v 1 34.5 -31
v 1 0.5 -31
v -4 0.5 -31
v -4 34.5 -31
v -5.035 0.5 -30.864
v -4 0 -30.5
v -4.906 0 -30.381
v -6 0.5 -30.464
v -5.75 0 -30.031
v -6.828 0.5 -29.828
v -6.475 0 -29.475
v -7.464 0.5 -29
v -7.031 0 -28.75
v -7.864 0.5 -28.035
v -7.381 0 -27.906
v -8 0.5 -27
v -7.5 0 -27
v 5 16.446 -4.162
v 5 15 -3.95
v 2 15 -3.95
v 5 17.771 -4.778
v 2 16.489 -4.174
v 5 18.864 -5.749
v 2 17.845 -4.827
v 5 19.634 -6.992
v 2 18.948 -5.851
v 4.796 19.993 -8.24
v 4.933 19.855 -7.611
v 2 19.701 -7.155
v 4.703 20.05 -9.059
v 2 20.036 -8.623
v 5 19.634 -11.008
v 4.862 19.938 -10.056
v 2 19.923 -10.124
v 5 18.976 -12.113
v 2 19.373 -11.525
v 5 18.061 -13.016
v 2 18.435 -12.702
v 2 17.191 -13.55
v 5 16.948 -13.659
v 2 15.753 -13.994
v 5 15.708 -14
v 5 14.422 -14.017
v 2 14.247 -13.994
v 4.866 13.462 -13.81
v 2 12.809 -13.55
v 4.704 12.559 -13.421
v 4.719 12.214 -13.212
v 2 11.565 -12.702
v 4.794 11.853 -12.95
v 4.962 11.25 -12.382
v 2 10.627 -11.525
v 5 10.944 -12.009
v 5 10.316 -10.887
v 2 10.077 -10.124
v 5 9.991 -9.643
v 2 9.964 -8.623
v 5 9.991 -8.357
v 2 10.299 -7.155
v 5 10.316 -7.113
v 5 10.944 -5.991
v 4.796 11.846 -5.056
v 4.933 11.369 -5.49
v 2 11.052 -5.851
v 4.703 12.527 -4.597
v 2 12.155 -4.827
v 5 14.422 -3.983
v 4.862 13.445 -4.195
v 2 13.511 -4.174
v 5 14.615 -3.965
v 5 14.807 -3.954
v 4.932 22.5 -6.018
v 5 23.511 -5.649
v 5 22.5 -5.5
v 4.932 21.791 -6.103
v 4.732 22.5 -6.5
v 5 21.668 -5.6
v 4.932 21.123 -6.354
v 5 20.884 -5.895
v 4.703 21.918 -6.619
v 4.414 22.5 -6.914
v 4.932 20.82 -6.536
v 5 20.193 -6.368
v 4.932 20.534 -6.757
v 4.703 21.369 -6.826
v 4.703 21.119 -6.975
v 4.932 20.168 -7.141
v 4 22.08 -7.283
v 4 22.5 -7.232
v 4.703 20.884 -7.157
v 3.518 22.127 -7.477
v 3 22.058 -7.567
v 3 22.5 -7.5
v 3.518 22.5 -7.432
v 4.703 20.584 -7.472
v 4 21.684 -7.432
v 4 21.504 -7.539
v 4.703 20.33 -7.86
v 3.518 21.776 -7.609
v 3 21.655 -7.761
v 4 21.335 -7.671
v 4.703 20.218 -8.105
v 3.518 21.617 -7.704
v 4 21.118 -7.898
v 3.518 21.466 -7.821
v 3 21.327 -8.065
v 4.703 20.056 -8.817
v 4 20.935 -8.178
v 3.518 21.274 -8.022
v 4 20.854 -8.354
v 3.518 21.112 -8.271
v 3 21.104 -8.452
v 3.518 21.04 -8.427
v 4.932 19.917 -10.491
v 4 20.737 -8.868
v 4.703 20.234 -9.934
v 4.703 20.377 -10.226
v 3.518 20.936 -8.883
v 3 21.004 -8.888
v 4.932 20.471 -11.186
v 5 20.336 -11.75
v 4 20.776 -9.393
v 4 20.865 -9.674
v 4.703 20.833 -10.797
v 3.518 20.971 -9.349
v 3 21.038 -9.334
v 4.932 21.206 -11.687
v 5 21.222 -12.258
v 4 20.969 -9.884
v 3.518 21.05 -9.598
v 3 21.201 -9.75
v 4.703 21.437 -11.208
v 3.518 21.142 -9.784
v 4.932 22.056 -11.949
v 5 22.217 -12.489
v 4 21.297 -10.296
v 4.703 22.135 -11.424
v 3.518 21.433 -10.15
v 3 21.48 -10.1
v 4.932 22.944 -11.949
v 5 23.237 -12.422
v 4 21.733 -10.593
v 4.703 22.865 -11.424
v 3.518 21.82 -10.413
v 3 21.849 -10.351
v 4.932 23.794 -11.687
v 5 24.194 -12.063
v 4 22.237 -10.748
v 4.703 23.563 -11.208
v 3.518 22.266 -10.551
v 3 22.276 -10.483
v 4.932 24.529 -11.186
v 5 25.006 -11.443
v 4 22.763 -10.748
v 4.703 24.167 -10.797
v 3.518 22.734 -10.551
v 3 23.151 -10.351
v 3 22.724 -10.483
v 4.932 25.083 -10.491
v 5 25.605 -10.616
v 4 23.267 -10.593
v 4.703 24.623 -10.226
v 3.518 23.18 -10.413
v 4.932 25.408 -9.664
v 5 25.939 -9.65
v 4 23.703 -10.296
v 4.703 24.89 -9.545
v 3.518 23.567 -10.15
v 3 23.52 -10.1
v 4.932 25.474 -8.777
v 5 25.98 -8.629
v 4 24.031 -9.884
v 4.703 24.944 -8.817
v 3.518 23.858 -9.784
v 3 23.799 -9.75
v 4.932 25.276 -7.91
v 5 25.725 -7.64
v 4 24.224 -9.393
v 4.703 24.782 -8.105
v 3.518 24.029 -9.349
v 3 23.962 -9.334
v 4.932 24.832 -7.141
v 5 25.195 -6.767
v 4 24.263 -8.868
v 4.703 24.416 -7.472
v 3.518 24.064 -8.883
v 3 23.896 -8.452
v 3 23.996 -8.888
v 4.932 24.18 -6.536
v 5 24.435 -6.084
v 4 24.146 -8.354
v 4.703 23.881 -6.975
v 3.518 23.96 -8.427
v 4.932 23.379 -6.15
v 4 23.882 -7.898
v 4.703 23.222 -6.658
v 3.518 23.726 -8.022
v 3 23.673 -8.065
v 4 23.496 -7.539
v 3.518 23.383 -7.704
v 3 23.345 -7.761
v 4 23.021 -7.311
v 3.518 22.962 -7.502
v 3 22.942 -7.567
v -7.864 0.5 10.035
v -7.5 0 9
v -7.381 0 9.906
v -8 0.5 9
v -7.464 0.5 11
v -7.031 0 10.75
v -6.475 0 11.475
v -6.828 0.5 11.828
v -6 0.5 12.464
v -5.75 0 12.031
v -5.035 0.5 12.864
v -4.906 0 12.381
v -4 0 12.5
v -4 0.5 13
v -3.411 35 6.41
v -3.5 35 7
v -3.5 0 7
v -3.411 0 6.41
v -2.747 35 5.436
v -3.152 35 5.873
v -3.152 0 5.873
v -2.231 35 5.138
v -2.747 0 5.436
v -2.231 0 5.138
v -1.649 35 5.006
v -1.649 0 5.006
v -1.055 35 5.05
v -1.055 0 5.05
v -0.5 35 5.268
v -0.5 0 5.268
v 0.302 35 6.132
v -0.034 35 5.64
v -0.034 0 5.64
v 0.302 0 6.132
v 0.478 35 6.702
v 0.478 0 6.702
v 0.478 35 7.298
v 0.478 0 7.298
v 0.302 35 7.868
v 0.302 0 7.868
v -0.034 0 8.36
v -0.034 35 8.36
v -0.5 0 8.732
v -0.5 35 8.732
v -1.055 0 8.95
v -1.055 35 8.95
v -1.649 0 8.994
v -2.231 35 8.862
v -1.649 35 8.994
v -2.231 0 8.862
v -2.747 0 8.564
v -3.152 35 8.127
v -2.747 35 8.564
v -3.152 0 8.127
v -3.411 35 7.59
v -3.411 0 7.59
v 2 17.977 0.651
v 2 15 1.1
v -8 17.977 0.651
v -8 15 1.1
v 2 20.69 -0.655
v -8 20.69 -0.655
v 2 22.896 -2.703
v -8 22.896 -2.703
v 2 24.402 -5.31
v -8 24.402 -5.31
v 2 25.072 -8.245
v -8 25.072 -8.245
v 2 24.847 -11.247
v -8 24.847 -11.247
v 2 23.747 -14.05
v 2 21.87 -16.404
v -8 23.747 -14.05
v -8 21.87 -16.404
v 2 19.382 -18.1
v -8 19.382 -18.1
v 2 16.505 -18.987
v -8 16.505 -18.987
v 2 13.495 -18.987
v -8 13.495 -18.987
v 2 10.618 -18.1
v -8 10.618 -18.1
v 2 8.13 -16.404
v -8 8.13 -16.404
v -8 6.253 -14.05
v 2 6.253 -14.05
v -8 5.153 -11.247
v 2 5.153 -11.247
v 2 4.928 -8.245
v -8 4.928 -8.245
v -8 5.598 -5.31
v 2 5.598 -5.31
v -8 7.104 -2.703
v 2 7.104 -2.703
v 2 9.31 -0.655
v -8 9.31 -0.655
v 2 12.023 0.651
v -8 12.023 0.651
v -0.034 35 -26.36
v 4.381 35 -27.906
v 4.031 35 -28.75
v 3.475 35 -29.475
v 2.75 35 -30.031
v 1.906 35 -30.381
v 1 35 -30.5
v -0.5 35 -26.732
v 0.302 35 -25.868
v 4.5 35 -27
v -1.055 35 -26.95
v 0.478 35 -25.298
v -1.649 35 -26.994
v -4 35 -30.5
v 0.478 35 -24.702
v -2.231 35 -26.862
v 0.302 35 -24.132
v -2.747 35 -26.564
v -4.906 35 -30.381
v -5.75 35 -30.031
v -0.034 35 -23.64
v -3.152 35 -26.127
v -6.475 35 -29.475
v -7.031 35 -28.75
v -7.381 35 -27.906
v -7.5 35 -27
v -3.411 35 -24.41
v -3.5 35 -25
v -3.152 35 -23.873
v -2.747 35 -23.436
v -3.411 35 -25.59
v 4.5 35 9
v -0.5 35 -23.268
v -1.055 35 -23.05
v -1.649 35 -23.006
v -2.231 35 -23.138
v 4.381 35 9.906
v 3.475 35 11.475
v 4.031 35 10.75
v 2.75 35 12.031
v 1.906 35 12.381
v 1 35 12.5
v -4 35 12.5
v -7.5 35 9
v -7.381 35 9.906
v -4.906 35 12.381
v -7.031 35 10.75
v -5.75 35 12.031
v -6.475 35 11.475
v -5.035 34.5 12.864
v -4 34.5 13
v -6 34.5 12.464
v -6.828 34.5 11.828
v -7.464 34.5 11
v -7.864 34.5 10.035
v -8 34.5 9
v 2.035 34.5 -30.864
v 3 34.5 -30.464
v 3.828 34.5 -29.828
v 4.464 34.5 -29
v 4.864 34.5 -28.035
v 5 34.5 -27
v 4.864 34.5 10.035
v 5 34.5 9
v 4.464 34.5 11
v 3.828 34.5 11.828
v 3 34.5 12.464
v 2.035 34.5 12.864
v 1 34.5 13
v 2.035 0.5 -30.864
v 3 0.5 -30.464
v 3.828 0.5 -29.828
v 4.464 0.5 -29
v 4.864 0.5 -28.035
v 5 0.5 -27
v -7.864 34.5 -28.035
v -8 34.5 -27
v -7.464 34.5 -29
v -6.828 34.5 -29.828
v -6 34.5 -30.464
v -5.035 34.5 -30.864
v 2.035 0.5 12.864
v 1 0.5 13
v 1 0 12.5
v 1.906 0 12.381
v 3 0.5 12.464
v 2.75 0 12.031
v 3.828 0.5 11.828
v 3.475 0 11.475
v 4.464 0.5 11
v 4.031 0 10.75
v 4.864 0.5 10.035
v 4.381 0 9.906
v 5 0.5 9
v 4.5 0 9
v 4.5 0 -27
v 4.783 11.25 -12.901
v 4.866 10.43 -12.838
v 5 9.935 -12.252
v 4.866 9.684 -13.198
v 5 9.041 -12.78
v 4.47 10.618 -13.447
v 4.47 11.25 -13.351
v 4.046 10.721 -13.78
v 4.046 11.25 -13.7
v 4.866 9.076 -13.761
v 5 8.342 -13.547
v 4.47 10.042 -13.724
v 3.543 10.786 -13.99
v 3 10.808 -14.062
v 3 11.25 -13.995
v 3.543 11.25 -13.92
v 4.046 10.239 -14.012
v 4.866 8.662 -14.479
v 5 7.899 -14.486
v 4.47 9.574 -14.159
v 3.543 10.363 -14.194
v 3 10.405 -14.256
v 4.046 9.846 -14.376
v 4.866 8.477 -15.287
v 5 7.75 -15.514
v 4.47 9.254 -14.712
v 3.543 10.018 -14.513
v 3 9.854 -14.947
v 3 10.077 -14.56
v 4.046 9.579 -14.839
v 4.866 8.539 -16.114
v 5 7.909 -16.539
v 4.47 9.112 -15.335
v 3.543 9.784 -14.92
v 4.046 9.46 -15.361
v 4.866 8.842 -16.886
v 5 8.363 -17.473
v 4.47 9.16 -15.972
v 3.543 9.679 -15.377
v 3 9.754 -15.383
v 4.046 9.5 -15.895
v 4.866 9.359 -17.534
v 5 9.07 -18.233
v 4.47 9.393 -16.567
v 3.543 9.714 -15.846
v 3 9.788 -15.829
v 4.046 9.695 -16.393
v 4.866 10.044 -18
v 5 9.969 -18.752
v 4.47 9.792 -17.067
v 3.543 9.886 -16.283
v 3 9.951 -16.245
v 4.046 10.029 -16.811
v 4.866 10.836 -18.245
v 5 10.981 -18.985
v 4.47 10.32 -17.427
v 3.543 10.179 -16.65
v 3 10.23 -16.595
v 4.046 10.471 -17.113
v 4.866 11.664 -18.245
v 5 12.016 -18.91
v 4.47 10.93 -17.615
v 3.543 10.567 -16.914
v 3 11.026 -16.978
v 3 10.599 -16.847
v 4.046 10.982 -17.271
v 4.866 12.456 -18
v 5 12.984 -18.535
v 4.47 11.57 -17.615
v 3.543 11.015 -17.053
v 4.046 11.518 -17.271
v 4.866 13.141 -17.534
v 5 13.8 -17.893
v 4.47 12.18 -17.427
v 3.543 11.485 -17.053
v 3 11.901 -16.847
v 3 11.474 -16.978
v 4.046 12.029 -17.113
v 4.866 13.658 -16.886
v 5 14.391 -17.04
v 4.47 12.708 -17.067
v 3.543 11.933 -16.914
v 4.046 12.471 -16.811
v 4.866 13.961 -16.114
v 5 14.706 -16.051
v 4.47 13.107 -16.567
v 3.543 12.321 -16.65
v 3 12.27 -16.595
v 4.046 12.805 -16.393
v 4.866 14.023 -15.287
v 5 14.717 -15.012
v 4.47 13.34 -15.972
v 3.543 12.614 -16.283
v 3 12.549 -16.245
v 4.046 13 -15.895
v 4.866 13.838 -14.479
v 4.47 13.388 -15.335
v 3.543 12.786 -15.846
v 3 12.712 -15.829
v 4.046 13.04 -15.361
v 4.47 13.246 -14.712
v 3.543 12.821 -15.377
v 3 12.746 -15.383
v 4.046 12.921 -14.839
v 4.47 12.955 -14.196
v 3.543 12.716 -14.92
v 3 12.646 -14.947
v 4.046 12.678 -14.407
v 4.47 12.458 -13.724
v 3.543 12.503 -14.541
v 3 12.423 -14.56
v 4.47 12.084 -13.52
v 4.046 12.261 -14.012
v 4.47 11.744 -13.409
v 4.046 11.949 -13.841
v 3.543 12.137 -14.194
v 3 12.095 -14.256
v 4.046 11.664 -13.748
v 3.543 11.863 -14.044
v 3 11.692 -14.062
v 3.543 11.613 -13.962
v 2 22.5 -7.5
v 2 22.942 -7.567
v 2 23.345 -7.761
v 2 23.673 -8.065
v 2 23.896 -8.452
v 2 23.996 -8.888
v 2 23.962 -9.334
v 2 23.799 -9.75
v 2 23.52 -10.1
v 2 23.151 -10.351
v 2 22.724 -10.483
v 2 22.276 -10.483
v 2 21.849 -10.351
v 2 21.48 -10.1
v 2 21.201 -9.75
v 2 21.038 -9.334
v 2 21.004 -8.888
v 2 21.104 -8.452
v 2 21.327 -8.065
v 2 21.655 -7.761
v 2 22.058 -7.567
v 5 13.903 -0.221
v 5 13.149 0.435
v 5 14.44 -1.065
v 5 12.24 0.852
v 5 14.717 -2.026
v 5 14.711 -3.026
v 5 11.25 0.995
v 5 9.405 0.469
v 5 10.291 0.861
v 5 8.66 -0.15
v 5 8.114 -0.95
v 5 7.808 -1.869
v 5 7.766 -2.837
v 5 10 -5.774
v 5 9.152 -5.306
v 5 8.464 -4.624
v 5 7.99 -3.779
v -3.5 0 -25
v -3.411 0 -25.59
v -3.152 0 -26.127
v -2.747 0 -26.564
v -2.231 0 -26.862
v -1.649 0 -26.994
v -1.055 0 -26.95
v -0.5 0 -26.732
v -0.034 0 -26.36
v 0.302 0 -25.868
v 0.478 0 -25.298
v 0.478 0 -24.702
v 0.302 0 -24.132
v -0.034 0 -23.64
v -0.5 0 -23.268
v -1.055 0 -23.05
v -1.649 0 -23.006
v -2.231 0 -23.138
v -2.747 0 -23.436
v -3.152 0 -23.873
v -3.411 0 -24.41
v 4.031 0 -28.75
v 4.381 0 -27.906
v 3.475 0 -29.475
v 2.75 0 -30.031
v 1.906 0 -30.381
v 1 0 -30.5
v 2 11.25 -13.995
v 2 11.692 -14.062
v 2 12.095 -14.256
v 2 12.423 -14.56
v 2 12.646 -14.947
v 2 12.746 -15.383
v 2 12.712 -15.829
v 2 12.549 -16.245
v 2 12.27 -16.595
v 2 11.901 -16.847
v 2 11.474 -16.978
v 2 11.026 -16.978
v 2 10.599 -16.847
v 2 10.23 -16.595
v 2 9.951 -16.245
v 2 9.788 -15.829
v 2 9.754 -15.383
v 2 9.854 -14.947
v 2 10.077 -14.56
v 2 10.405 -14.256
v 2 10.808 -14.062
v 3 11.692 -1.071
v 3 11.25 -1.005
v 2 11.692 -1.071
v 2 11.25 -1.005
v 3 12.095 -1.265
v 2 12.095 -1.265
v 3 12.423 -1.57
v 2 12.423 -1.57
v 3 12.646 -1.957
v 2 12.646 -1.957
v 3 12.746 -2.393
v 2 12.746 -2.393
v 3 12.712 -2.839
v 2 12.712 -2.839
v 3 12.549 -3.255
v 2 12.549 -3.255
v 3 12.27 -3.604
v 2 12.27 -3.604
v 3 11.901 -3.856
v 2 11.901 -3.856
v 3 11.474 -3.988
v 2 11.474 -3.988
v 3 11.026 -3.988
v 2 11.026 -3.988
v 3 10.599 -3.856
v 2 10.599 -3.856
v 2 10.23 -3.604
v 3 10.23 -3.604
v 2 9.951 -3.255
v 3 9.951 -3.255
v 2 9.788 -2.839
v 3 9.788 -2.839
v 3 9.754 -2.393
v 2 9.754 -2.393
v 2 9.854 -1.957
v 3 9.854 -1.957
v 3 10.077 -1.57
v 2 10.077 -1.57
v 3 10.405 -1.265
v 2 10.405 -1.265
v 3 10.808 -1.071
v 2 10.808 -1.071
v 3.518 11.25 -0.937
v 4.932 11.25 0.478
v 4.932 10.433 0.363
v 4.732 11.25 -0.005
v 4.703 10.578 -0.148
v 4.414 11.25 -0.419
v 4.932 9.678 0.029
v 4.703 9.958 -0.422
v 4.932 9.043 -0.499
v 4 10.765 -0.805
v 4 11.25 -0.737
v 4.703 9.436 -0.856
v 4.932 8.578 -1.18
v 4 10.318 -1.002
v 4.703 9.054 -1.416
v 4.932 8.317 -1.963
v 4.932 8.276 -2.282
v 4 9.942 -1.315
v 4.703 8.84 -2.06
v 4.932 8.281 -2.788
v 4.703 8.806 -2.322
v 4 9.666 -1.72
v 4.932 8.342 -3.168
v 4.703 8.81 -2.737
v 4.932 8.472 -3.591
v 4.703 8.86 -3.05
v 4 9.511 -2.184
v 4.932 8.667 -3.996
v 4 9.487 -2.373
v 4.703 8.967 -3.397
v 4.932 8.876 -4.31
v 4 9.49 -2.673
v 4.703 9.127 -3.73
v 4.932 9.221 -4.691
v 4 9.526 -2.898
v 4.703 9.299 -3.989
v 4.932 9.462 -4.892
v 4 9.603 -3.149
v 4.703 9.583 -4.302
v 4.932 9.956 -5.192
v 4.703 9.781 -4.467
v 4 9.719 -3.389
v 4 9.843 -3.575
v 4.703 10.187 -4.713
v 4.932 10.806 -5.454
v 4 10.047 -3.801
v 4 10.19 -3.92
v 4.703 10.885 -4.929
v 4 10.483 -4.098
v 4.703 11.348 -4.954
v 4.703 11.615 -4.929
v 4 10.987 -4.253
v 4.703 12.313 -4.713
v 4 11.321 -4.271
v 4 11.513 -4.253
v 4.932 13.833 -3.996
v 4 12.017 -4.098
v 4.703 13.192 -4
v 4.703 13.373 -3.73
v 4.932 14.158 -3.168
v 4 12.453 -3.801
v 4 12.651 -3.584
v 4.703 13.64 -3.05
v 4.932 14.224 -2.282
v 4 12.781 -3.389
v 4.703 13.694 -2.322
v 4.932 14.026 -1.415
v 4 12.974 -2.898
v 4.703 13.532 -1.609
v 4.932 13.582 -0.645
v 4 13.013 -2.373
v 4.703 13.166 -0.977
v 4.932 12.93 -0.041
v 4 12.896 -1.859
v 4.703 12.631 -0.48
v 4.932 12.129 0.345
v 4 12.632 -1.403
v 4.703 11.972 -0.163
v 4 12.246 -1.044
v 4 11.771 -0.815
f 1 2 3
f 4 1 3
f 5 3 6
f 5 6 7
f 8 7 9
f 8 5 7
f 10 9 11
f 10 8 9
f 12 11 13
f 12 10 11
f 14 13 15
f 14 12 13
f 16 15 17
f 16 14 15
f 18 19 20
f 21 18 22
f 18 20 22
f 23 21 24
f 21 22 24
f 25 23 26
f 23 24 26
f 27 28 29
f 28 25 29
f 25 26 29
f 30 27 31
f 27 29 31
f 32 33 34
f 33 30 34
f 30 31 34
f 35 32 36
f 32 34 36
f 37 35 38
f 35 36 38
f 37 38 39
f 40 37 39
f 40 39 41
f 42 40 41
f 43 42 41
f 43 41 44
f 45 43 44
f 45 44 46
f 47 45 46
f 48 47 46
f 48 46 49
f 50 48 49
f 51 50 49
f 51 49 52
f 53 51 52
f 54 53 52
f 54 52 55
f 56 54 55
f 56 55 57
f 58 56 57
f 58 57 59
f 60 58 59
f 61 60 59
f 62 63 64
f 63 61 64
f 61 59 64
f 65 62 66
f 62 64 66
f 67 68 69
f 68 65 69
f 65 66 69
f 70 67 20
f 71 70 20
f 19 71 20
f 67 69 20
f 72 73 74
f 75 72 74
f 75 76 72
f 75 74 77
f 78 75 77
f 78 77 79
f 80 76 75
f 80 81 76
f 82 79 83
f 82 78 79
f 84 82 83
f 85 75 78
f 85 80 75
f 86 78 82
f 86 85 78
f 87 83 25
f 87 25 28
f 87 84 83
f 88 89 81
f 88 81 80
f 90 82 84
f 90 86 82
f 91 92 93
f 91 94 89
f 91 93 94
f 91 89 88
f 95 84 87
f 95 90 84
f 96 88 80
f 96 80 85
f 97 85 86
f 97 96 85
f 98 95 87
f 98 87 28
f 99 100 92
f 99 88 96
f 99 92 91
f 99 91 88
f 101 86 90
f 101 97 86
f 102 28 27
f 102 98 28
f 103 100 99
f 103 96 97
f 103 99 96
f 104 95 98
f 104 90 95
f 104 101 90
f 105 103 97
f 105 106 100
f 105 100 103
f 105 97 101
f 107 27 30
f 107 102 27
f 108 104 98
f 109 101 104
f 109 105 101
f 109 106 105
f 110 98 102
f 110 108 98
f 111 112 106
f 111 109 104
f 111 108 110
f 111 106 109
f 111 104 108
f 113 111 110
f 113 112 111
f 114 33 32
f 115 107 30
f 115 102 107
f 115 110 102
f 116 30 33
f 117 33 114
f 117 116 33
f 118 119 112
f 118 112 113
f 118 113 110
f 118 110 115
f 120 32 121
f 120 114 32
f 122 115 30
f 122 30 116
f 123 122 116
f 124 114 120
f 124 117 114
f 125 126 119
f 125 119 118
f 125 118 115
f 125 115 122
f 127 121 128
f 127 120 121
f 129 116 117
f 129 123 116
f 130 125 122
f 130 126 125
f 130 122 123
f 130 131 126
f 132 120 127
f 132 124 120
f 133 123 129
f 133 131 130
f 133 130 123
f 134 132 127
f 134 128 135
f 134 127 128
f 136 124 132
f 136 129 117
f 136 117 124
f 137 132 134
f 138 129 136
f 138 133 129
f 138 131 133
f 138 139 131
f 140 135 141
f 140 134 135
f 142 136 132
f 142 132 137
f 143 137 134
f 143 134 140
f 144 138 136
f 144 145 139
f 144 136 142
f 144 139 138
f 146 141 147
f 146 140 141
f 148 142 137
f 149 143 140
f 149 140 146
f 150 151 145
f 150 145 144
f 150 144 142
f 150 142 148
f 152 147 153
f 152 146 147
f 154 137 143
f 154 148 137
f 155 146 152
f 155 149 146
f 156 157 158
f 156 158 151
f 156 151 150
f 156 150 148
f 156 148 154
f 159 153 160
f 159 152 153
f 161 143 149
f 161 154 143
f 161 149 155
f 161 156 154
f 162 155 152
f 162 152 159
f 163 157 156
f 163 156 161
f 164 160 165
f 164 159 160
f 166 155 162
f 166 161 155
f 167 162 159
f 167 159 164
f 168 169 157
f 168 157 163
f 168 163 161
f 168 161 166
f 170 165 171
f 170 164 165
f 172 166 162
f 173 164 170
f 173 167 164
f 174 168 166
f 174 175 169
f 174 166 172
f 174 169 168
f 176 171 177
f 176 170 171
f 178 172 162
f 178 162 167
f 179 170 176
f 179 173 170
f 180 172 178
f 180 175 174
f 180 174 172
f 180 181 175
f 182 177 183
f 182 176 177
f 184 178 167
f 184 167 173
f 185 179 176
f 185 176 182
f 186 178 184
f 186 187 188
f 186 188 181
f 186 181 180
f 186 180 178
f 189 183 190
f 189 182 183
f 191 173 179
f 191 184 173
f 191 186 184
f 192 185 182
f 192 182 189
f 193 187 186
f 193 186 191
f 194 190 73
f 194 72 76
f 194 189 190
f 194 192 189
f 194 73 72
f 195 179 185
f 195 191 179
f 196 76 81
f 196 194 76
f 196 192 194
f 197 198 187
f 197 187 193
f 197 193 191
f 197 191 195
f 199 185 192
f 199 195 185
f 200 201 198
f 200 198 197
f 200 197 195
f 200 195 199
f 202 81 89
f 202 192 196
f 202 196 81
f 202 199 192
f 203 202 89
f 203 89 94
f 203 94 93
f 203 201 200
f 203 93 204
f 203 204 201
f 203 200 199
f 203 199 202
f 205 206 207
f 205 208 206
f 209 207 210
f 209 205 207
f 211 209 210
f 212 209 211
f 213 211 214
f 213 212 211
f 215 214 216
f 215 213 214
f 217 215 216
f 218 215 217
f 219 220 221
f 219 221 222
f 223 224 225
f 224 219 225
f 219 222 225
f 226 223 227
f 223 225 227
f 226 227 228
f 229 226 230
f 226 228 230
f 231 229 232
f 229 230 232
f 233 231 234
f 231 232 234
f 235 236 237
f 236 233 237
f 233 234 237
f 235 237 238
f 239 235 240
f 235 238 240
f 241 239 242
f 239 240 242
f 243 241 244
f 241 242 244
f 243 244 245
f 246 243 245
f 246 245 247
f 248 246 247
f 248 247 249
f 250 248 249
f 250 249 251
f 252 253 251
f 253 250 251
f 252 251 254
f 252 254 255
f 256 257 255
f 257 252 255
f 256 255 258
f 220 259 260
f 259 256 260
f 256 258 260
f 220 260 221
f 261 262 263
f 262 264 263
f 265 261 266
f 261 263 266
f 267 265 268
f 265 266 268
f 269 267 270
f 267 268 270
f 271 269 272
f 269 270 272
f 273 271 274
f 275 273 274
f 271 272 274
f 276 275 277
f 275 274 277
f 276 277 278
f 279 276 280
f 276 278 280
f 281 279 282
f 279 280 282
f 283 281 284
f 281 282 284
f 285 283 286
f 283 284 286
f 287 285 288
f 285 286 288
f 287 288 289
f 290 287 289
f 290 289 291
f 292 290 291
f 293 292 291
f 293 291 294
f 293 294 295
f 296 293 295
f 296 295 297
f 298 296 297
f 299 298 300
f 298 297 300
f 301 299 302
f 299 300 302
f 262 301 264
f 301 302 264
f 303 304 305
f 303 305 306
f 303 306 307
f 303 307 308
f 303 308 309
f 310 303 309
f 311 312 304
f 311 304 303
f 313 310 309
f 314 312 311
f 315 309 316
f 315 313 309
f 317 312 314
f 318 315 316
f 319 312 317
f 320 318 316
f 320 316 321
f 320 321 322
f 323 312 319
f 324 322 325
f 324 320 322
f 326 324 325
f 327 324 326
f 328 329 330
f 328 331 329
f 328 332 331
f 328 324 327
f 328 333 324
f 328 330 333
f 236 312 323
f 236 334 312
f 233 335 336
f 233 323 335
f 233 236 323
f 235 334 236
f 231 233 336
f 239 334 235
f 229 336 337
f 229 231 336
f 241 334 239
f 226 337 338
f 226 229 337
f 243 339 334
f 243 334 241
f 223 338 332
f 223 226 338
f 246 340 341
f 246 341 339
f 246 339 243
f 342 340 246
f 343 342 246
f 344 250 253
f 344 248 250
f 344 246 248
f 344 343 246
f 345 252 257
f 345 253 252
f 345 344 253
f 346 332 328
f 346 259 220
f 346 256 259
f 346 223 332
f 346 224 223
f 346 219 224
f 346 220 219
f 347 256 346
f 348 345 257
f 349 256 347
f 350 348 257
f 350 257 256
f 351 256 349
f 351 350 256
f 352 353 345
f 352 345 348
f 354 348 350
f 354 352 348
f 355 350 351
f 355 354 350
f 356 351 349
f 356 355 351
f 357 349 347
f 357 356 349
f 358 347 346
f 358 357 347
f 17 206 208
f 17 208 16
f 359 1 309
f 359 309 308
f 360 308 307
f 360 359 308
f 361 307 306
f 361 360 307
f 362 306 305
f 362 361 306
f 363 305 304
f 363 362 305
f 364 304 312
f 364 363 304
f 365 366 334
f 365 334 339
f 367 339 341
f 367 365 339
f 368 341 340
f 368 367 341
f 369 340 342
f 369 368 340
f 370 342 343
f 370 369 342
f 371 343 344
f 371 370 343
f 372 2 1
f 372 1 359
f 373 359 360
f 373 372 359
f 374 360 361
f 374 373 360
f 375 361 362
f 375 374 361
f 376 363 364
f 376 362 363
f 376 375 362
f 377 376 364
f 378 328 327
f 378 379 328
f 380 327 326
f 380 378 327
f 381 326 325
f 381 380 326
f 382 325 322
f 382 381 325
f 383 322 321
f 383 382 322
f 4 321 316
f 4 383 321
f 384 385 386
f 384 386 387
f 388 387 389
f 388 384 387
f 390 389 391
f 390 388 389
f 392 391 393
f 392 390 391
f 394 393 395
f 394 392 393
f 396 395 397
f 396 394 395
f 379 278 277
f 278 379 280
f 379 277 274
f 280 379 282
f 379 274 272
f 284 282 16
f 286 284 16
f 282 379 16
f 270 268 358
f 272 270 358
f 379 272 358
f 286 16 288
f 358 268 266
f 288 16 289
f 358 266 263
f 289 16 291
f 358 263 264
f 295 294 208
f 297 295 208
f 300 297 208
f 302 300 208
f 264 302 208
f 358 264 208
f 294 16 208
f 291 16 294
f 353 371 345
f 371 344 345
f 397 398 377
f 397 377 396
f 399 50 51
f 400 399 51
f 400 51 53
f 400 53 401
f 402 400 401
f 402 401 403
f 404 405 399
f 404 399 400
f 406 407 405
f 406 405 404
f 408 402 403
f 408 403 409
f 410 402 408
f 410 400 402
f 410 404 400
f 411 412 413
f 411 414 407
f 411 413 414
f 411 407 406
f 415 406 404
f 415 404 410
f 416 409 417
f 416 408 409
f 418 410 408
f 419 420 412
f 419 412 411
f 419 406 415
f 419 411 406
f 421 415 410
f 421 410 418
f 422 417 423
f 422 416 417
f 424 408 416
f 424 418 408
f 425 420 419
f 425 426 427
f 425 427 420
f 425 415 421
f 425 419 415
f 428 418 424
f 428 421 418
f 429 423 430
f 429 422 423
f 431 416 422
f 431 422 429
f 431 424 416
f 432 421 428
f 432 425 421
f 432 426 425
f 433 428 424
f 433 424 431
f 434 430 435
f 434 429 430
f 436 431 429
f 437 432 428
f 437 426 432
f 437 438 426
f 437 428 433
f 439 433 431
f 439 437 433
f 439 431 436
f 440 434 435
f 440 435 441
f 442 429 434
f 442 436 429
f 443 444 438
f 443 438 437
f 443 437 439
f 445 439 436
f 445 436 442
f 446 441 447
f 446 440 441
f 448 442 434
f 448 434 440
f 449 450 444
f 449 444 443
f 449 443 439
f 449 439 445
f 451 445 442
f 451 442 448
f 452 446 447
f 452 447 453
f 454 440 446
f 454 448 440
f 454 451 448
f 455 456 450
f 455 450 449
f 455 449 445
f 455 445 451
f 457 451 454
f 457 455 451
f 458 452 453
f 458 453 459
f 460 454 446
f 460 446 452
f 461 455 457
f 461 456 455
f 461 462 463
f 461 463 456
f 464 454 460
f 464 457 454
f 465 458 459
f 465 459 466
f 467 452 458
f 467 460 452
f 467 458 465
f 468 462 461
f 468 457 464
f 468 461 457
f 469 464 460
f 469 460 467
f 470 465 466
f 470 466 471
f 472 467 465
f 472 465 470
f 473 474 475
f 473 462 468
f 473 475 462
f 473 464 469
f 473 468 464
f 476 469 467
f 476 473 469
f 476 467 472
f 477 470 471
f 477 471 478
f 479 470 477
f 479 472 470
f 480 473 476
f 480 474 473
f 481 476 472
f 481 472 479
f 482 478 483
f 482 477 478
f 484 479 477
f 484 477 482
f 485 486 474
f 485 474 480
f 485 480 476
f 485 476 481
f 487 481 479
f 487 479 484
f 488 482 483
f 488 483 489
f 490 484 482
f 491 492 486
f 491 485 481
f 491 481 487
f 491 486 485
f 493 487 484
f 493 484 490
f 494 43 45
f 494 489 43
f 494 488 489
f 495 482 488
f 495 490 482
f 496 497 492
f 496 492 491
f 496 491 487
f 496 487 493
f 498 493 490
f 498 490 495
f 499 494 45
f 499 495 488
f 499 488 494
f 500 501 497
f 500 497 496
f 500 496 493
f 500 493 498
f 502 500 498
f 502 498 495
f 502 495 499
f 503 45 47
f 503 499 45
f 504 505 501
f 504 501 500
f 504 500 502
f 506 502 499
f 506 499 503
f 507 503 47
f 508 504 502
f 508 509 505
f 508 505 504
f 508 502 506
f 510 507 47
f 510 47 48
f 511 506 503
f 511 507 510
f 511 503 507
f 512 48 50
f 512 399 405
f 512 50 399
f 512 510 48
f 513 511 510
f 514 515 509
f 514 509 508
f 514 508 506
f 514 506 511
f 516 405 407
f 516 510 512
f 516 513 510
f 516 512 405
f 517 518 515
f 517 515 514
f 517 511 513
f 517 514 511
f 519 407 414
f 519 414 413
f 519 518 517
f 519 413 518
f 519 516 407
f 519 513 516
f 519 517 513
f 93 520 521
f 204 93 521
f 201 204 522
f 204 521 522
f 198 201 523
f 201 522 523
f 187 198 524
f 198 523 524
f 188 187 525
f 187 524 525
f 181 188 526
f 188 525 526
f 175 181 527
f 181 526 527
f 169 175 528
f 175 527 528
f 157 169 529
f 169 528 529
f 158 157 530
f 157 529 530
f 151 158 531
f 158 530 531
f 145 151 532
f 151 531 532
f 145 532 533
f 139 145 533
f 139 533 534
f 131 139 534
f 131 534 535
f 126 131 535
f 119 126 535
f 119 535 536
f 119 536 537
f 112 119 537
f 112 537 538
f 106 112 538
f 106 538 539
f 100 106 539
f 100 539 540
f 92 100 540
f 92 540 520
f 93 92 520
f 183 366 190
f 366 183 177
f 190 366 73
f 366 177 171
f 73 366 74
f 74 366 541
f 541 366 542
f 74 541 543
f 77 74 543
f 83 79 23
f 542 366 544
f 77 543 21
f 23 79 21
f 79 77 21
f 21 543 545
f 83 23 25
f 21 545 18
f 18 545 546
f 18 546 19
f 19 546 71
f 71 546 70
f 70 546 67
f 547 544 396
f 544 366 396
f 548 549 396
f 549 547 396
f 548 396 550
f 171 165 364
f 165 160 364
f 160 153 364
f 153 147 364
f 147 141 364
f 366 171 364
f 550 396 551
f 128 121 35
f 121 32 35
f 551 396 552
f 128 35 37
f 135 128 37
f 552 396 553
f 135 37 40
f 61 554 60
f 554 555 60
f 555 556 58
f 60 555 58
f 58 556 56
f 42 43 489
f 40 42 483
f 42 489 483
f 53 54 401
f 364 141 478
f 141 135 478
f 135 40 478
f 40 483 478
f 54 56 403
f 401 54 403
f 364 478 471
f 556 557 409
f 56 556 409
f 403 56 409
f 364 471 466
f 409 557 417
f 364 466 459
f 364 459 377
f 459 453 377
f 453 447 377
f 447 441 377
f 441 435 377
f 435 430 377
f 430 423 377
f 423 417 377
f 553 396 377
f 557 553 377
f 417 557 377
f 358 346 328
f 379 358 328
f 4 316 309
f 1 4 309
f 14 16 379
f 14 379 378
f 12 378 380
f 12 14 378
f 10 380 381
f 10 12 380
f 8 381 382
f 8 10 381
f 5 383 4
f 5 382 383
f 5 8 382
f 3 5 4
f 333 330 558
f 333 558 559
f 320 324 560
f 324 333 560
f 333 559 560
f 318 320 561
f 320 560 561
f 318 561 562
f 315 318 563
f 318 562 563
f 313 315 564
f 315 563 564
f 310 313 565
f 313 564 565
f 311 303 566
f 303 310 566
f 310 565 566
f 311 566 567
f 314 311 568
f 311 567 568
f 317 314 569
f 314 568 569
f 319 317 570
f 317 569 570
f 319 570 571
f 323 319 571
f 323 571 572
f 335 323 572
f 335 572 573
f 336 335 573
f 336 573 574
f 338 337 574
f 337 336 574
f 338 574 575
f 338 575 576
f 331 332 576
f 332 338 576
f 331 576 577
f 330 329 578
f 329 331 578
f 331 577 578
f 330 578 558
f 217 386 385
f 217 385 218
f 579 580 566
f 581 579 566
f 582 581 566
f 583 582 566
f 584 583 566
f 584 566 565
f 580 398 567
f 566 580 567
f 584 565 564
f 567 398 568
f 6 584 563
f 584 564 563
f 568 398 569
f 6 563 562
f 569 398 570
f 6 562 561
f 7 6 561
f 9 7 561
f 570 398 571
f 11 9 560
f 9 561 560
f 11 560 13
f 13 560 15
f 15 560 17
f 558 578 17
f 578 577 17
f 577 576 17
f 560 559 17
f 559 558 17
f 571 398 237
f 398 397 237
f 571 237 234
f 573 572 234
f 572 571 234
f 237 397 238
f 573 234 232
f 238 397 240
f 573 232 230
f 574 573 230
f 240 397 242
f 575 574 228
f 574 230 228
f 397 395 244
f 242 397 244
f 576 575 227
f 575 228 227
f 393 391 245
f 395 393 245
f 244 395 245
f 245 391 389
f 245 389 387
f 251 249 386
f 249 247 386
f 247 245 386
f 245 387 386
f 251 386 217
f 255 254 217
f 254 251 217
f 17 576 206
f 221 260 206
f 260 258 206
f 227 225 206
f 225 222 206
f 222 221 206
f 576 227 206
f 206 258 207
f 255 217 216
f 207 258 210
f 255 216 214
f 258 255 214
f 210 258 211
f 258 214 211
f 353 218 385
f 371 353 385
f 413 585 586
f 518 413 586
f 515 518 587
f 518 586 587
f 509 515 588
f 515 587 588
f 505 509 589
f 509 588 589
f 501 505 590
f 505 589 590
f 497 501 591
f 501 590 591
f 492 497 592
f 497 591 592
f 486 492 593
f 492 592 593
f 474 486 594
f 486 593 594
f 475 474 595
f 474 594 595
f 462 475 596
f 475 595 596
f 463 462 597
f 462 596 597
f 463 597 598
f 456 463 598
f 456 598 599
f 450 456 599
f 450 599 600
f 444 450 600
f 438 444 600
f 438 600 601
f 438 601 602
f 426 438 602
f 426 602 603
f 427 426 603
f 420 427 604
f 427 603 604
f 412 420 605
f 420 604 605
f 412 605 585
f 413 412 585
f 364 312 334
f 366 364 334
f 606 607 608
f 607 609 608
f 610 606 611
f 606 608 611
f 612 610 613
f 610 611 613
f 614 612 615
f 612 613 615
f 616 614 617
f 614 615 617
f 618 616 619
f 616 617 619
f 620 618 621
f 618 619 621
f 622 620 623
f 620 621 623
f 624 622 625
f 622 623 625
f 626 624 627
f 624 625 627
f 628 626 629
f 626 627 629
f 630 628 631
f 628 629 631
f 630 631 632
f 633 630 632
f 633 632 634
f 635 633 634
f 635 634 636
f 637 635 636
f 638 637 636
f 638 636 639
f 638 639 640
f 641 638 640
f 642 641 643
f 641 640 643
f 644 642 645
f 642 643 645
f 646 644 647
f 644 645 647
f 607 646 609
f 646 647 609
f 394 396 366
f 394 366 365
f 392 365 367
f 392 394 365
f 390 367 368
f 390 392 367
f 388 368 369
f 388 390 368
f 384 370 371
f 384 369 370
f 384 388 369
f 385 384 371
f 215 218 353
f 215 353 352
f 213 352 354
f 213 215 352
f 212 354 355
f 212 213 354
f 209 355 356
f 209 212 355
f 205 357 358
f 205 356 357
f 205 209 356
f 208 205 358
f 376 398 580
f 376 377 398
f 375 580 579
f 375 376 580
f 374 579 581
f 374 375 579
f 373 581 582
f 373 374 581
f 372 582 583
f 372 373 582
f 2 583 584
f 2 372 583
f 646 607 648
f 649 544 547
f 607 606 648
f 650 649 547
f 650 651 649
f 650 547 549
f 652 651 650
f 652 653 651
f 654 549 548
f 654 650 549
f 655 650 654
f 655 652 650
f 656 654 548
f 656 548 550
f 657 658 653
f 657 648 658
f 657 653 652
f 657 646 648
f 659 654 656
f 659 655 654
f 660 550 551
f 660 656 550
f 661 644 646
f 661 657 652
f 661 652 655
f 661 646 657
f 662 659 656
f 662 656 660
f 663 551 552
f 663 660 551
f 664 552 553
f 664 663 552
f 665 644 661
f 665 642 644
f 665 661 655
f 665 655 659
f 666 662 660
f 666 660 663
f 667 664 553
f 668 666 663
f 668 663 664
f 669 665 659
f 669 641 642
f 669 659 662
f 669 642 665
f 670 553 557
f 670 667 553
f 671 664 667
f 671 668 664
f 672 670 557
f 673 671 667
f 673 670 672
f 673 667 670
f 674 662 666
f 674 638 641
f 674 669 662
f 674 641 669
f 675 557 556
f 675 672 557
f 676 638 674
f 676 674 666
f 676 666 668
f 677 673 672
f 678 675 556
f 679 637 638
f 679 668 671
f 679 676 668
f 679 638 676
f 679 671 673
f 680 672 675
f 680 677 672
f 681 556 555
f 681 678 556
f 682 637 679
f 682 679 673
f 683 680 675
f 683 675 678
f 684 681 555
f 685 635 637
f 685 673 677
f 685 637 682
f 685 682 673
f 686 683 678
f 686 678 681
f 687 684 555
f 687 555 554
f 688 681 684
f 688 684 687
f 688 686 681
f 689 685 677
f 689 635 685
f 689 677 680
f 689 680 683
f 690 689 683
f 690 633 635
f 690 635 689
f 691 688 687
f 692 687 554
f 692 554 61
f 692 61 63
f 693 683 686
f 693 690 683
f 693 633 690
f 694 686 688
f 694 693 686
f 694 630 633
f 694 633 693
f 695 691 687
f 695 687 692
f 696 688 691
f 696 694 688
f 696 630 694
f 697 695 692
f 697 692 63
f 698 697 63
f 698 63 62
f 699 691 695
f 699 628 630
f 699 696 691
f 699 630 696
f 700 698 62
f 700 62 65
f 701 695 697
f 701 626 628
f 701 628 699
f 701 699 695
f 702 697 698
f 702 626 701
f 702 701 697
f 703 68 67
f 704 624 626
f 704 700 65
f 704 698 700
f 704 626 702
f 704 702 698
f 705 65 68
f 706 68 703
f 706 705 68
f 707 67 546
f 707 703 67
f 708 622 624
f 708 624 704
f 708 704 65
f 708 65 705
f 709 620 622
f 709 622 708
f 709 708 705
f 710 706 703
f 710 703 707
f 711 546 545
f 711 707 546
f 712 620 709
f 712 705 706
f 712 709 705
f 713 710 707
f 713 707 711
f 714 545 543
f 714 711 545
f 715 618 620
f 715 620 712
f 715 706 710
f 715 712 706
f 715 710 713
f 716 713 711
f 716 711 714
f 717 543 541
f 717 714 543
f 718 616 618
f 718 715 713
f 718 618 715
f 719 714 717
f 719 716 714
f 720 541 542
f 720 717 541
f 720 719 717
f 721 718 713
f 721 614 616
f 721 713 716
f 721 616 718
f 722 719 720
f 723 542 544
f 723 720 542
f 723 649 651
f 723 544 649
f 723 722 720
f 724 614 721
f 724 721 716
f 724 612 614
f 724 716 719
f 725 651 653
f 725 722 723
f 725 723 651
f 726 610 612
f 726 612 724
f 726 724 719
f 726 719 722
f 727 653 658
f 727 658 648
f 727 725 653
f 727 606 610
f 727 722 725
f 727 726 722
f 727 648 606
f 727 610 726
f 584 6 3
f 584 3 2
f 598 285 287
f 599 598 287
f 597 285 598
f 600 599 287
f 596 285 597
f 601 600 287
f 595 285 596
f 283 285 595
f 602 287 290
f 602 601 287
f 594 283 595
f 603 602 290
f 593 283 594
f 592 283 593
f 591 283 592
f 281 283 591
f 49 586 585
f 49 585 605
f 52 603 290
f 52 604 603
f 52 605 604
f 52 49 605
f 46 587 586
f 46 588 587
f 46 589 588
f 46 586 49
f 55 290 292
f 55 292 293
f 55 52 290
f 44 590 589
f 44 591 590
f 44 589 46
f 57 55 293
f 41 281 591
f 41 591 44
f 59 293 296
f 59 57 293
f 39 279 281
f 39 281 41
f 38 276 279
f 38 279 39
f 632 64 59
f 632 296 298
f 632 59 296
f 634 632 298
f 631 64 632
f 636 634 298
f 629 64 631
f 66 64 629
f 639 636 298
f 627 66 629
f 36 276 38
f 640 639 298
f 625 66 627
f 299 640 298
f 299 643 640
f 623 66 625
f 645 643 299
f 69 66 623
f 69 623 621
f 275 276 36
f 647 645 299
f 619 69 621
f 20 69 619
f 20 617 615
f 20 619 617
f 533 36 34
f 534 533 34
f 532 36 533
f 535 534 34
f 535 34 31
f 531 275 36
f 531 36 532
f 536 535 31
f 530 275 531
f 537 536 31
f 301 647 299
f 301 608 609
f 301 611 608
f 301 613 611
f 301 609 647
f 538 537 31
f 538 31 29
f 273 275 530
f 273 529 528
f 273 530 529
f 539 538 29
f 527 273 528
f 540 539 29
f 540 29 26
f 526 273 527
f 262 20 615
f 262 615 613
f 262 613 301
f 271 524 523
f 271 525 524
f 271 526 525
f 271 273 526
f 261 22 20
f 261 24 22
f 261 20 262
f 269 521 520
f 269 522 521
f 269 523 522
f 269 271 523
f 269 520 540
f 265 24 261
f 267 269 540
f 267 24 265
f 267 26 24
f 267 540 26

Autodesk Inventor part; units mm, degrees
ref_plane "YZ Plane" through (0, 0, 0) normal (1, 0, 0) x (0, 1, 0)
ref_plane "XZ Plane" through (0, 0, 0) normal (0, 1, 0) x (-1, 0, 0)
ref_plane "XY Plane" through (0, 0, 0) normal (0, 0, 1) x (1, 0, 0)
sketch "Эскиз1" plane through (0, 0, 0) normal (0, 1, 0) x (-1, 0, 0)
  line L0 (4, 13) -> (-1, 13)
  line L1 (-5, 9) -> (-5, -27)
  line L2 (-1, -31) -> (4, -31)
  line L3 (8, -27) -> (8, 9)
  circle A0 centre (1.5, 7) radius 2
  circle A1 centre (1.5, -25) radius 2
  arc A2 (8, 9) -> (4, 13) centre (4, 9) ccw
  arc A3 (-1, 13) -> (-5, 9) centre (-1, 9) ccw
  arc A4 (-5, -27) -> (-1, -31) centre (-1, -27) ccw
  arc A5 (4, -31) -> (8, -27) centre (4, -27) ccw
  point P0 (0, 0)
  point P1 (-5, -31)
  point P2 (-5, 13)
  point P3 (8, -31)
  dimension "d0" = 13
  dimension "d1" = 44
  dimension "d2" = 4
  dimension "d3" = 4
  dimension "d4" = 32
  dimension "d5" = 6.5
  dimension "d6" = 6
  dimension "d7" = 4
extrude "Выдавливание1" add sketch "Эскиз1" along normal blind 35
sketch "Эскиз2" plane through (-8, 0, -27) normal (-1, 0, 0) x (0, 0, 1)
  circle A0 centre (18, 15) radius 10.1
  circle A1 centre (18, 15) radius 5.05
  line L0 (0, 0) -> (36, 0) projected
  line L1 (36, 0) -> (36, 35) projected
  circle A2 centre (18, 15) radius 7.5 construction
  circle A3 centre (18, 22.5) radius 1.5
  line L2 (18, 15) -> (25.5, 15)
  line L3 (18, 15) -> (24.4952, 11.25)
  line L4 (18, 15) -> (25.5, 15) construction
  circle A4 centre (24.4952, 11.25) radius 1.5
  line L5 (18, 15) -> (10.5, 15)
  line L6 (18, 15) -> (24.4952, 11.25)
  line L7 (18, 15) -> (25.5, 15) construction
  line L8 (18, 15) -> (11.5048, 11.25)
  line L9 (18, 15) -> (25.5, 15) construction
  circle A5 centre (11.5048, 11.25) radius 1.5
  point P0 (27, 0)
  dimension "d10" = 20.2
  dimension "d11" = 10.1
  dimension "d12" = 15
  dimension "d13" = 18
  dimension "d14" = 15
  dimension "d15" = 3
  dimension "d16" = 30
  dimension "d17" = 3
  dimension "d18" = 30
  dimension "d19" = 150
  dimension "d20" = 3
extrude "Выдавливание2" cut sketch "Эскиз2" against normal blind 40 contours L2 L5 A1 | A1 L3 L2 | L5 L8 A1 | A1 L8 L3 | A3 | A4 | A5
sketch "Эскиз3" plane through (-8, 0, -27) normal (-1, 0, 0) x (0, 0, 1)
  circle A0 centre (18, 15) radius 5
  circle A1 centre (18, 15) radius 10.1
  line L0 (0, 0) -> (36, 0) projected
  point P0 (27, 0)
  dimension "d23" = 20.2
  dimension "d29" = 15
extrude "Выдавливание3" cut sketch "Эскиз3" against normal blind 10
chamfer "Фаска1" distance 0.5 angle 45 16 edges at (-8, 35, -9) (-6.8284, 35, 11.8284) (-1.5, 35, 13) (3.8284, 35, 11.8284) (5, 35, -9) (3.8284, 35, -29.8284) (-1.5, 35, -31) (-6.8284, 35, -29.8284) (-8, 0, -9) (-6.8284, 0, 11.8284) (-1.5, 0, 13) (3.8284, 0, 11.8284) (5, 0, -9) (3.8284, 0, -29.8284) (-1.5, 0, -31) (-6.8284, 0, -29.8284)
fillet "Сопряжение1" radius 2 3 edges at (5, 22.5, -10.5) (5, 11.25, -4.0048) (5, 11.25, -16.9952)
properties part number "fastenin_motor"
